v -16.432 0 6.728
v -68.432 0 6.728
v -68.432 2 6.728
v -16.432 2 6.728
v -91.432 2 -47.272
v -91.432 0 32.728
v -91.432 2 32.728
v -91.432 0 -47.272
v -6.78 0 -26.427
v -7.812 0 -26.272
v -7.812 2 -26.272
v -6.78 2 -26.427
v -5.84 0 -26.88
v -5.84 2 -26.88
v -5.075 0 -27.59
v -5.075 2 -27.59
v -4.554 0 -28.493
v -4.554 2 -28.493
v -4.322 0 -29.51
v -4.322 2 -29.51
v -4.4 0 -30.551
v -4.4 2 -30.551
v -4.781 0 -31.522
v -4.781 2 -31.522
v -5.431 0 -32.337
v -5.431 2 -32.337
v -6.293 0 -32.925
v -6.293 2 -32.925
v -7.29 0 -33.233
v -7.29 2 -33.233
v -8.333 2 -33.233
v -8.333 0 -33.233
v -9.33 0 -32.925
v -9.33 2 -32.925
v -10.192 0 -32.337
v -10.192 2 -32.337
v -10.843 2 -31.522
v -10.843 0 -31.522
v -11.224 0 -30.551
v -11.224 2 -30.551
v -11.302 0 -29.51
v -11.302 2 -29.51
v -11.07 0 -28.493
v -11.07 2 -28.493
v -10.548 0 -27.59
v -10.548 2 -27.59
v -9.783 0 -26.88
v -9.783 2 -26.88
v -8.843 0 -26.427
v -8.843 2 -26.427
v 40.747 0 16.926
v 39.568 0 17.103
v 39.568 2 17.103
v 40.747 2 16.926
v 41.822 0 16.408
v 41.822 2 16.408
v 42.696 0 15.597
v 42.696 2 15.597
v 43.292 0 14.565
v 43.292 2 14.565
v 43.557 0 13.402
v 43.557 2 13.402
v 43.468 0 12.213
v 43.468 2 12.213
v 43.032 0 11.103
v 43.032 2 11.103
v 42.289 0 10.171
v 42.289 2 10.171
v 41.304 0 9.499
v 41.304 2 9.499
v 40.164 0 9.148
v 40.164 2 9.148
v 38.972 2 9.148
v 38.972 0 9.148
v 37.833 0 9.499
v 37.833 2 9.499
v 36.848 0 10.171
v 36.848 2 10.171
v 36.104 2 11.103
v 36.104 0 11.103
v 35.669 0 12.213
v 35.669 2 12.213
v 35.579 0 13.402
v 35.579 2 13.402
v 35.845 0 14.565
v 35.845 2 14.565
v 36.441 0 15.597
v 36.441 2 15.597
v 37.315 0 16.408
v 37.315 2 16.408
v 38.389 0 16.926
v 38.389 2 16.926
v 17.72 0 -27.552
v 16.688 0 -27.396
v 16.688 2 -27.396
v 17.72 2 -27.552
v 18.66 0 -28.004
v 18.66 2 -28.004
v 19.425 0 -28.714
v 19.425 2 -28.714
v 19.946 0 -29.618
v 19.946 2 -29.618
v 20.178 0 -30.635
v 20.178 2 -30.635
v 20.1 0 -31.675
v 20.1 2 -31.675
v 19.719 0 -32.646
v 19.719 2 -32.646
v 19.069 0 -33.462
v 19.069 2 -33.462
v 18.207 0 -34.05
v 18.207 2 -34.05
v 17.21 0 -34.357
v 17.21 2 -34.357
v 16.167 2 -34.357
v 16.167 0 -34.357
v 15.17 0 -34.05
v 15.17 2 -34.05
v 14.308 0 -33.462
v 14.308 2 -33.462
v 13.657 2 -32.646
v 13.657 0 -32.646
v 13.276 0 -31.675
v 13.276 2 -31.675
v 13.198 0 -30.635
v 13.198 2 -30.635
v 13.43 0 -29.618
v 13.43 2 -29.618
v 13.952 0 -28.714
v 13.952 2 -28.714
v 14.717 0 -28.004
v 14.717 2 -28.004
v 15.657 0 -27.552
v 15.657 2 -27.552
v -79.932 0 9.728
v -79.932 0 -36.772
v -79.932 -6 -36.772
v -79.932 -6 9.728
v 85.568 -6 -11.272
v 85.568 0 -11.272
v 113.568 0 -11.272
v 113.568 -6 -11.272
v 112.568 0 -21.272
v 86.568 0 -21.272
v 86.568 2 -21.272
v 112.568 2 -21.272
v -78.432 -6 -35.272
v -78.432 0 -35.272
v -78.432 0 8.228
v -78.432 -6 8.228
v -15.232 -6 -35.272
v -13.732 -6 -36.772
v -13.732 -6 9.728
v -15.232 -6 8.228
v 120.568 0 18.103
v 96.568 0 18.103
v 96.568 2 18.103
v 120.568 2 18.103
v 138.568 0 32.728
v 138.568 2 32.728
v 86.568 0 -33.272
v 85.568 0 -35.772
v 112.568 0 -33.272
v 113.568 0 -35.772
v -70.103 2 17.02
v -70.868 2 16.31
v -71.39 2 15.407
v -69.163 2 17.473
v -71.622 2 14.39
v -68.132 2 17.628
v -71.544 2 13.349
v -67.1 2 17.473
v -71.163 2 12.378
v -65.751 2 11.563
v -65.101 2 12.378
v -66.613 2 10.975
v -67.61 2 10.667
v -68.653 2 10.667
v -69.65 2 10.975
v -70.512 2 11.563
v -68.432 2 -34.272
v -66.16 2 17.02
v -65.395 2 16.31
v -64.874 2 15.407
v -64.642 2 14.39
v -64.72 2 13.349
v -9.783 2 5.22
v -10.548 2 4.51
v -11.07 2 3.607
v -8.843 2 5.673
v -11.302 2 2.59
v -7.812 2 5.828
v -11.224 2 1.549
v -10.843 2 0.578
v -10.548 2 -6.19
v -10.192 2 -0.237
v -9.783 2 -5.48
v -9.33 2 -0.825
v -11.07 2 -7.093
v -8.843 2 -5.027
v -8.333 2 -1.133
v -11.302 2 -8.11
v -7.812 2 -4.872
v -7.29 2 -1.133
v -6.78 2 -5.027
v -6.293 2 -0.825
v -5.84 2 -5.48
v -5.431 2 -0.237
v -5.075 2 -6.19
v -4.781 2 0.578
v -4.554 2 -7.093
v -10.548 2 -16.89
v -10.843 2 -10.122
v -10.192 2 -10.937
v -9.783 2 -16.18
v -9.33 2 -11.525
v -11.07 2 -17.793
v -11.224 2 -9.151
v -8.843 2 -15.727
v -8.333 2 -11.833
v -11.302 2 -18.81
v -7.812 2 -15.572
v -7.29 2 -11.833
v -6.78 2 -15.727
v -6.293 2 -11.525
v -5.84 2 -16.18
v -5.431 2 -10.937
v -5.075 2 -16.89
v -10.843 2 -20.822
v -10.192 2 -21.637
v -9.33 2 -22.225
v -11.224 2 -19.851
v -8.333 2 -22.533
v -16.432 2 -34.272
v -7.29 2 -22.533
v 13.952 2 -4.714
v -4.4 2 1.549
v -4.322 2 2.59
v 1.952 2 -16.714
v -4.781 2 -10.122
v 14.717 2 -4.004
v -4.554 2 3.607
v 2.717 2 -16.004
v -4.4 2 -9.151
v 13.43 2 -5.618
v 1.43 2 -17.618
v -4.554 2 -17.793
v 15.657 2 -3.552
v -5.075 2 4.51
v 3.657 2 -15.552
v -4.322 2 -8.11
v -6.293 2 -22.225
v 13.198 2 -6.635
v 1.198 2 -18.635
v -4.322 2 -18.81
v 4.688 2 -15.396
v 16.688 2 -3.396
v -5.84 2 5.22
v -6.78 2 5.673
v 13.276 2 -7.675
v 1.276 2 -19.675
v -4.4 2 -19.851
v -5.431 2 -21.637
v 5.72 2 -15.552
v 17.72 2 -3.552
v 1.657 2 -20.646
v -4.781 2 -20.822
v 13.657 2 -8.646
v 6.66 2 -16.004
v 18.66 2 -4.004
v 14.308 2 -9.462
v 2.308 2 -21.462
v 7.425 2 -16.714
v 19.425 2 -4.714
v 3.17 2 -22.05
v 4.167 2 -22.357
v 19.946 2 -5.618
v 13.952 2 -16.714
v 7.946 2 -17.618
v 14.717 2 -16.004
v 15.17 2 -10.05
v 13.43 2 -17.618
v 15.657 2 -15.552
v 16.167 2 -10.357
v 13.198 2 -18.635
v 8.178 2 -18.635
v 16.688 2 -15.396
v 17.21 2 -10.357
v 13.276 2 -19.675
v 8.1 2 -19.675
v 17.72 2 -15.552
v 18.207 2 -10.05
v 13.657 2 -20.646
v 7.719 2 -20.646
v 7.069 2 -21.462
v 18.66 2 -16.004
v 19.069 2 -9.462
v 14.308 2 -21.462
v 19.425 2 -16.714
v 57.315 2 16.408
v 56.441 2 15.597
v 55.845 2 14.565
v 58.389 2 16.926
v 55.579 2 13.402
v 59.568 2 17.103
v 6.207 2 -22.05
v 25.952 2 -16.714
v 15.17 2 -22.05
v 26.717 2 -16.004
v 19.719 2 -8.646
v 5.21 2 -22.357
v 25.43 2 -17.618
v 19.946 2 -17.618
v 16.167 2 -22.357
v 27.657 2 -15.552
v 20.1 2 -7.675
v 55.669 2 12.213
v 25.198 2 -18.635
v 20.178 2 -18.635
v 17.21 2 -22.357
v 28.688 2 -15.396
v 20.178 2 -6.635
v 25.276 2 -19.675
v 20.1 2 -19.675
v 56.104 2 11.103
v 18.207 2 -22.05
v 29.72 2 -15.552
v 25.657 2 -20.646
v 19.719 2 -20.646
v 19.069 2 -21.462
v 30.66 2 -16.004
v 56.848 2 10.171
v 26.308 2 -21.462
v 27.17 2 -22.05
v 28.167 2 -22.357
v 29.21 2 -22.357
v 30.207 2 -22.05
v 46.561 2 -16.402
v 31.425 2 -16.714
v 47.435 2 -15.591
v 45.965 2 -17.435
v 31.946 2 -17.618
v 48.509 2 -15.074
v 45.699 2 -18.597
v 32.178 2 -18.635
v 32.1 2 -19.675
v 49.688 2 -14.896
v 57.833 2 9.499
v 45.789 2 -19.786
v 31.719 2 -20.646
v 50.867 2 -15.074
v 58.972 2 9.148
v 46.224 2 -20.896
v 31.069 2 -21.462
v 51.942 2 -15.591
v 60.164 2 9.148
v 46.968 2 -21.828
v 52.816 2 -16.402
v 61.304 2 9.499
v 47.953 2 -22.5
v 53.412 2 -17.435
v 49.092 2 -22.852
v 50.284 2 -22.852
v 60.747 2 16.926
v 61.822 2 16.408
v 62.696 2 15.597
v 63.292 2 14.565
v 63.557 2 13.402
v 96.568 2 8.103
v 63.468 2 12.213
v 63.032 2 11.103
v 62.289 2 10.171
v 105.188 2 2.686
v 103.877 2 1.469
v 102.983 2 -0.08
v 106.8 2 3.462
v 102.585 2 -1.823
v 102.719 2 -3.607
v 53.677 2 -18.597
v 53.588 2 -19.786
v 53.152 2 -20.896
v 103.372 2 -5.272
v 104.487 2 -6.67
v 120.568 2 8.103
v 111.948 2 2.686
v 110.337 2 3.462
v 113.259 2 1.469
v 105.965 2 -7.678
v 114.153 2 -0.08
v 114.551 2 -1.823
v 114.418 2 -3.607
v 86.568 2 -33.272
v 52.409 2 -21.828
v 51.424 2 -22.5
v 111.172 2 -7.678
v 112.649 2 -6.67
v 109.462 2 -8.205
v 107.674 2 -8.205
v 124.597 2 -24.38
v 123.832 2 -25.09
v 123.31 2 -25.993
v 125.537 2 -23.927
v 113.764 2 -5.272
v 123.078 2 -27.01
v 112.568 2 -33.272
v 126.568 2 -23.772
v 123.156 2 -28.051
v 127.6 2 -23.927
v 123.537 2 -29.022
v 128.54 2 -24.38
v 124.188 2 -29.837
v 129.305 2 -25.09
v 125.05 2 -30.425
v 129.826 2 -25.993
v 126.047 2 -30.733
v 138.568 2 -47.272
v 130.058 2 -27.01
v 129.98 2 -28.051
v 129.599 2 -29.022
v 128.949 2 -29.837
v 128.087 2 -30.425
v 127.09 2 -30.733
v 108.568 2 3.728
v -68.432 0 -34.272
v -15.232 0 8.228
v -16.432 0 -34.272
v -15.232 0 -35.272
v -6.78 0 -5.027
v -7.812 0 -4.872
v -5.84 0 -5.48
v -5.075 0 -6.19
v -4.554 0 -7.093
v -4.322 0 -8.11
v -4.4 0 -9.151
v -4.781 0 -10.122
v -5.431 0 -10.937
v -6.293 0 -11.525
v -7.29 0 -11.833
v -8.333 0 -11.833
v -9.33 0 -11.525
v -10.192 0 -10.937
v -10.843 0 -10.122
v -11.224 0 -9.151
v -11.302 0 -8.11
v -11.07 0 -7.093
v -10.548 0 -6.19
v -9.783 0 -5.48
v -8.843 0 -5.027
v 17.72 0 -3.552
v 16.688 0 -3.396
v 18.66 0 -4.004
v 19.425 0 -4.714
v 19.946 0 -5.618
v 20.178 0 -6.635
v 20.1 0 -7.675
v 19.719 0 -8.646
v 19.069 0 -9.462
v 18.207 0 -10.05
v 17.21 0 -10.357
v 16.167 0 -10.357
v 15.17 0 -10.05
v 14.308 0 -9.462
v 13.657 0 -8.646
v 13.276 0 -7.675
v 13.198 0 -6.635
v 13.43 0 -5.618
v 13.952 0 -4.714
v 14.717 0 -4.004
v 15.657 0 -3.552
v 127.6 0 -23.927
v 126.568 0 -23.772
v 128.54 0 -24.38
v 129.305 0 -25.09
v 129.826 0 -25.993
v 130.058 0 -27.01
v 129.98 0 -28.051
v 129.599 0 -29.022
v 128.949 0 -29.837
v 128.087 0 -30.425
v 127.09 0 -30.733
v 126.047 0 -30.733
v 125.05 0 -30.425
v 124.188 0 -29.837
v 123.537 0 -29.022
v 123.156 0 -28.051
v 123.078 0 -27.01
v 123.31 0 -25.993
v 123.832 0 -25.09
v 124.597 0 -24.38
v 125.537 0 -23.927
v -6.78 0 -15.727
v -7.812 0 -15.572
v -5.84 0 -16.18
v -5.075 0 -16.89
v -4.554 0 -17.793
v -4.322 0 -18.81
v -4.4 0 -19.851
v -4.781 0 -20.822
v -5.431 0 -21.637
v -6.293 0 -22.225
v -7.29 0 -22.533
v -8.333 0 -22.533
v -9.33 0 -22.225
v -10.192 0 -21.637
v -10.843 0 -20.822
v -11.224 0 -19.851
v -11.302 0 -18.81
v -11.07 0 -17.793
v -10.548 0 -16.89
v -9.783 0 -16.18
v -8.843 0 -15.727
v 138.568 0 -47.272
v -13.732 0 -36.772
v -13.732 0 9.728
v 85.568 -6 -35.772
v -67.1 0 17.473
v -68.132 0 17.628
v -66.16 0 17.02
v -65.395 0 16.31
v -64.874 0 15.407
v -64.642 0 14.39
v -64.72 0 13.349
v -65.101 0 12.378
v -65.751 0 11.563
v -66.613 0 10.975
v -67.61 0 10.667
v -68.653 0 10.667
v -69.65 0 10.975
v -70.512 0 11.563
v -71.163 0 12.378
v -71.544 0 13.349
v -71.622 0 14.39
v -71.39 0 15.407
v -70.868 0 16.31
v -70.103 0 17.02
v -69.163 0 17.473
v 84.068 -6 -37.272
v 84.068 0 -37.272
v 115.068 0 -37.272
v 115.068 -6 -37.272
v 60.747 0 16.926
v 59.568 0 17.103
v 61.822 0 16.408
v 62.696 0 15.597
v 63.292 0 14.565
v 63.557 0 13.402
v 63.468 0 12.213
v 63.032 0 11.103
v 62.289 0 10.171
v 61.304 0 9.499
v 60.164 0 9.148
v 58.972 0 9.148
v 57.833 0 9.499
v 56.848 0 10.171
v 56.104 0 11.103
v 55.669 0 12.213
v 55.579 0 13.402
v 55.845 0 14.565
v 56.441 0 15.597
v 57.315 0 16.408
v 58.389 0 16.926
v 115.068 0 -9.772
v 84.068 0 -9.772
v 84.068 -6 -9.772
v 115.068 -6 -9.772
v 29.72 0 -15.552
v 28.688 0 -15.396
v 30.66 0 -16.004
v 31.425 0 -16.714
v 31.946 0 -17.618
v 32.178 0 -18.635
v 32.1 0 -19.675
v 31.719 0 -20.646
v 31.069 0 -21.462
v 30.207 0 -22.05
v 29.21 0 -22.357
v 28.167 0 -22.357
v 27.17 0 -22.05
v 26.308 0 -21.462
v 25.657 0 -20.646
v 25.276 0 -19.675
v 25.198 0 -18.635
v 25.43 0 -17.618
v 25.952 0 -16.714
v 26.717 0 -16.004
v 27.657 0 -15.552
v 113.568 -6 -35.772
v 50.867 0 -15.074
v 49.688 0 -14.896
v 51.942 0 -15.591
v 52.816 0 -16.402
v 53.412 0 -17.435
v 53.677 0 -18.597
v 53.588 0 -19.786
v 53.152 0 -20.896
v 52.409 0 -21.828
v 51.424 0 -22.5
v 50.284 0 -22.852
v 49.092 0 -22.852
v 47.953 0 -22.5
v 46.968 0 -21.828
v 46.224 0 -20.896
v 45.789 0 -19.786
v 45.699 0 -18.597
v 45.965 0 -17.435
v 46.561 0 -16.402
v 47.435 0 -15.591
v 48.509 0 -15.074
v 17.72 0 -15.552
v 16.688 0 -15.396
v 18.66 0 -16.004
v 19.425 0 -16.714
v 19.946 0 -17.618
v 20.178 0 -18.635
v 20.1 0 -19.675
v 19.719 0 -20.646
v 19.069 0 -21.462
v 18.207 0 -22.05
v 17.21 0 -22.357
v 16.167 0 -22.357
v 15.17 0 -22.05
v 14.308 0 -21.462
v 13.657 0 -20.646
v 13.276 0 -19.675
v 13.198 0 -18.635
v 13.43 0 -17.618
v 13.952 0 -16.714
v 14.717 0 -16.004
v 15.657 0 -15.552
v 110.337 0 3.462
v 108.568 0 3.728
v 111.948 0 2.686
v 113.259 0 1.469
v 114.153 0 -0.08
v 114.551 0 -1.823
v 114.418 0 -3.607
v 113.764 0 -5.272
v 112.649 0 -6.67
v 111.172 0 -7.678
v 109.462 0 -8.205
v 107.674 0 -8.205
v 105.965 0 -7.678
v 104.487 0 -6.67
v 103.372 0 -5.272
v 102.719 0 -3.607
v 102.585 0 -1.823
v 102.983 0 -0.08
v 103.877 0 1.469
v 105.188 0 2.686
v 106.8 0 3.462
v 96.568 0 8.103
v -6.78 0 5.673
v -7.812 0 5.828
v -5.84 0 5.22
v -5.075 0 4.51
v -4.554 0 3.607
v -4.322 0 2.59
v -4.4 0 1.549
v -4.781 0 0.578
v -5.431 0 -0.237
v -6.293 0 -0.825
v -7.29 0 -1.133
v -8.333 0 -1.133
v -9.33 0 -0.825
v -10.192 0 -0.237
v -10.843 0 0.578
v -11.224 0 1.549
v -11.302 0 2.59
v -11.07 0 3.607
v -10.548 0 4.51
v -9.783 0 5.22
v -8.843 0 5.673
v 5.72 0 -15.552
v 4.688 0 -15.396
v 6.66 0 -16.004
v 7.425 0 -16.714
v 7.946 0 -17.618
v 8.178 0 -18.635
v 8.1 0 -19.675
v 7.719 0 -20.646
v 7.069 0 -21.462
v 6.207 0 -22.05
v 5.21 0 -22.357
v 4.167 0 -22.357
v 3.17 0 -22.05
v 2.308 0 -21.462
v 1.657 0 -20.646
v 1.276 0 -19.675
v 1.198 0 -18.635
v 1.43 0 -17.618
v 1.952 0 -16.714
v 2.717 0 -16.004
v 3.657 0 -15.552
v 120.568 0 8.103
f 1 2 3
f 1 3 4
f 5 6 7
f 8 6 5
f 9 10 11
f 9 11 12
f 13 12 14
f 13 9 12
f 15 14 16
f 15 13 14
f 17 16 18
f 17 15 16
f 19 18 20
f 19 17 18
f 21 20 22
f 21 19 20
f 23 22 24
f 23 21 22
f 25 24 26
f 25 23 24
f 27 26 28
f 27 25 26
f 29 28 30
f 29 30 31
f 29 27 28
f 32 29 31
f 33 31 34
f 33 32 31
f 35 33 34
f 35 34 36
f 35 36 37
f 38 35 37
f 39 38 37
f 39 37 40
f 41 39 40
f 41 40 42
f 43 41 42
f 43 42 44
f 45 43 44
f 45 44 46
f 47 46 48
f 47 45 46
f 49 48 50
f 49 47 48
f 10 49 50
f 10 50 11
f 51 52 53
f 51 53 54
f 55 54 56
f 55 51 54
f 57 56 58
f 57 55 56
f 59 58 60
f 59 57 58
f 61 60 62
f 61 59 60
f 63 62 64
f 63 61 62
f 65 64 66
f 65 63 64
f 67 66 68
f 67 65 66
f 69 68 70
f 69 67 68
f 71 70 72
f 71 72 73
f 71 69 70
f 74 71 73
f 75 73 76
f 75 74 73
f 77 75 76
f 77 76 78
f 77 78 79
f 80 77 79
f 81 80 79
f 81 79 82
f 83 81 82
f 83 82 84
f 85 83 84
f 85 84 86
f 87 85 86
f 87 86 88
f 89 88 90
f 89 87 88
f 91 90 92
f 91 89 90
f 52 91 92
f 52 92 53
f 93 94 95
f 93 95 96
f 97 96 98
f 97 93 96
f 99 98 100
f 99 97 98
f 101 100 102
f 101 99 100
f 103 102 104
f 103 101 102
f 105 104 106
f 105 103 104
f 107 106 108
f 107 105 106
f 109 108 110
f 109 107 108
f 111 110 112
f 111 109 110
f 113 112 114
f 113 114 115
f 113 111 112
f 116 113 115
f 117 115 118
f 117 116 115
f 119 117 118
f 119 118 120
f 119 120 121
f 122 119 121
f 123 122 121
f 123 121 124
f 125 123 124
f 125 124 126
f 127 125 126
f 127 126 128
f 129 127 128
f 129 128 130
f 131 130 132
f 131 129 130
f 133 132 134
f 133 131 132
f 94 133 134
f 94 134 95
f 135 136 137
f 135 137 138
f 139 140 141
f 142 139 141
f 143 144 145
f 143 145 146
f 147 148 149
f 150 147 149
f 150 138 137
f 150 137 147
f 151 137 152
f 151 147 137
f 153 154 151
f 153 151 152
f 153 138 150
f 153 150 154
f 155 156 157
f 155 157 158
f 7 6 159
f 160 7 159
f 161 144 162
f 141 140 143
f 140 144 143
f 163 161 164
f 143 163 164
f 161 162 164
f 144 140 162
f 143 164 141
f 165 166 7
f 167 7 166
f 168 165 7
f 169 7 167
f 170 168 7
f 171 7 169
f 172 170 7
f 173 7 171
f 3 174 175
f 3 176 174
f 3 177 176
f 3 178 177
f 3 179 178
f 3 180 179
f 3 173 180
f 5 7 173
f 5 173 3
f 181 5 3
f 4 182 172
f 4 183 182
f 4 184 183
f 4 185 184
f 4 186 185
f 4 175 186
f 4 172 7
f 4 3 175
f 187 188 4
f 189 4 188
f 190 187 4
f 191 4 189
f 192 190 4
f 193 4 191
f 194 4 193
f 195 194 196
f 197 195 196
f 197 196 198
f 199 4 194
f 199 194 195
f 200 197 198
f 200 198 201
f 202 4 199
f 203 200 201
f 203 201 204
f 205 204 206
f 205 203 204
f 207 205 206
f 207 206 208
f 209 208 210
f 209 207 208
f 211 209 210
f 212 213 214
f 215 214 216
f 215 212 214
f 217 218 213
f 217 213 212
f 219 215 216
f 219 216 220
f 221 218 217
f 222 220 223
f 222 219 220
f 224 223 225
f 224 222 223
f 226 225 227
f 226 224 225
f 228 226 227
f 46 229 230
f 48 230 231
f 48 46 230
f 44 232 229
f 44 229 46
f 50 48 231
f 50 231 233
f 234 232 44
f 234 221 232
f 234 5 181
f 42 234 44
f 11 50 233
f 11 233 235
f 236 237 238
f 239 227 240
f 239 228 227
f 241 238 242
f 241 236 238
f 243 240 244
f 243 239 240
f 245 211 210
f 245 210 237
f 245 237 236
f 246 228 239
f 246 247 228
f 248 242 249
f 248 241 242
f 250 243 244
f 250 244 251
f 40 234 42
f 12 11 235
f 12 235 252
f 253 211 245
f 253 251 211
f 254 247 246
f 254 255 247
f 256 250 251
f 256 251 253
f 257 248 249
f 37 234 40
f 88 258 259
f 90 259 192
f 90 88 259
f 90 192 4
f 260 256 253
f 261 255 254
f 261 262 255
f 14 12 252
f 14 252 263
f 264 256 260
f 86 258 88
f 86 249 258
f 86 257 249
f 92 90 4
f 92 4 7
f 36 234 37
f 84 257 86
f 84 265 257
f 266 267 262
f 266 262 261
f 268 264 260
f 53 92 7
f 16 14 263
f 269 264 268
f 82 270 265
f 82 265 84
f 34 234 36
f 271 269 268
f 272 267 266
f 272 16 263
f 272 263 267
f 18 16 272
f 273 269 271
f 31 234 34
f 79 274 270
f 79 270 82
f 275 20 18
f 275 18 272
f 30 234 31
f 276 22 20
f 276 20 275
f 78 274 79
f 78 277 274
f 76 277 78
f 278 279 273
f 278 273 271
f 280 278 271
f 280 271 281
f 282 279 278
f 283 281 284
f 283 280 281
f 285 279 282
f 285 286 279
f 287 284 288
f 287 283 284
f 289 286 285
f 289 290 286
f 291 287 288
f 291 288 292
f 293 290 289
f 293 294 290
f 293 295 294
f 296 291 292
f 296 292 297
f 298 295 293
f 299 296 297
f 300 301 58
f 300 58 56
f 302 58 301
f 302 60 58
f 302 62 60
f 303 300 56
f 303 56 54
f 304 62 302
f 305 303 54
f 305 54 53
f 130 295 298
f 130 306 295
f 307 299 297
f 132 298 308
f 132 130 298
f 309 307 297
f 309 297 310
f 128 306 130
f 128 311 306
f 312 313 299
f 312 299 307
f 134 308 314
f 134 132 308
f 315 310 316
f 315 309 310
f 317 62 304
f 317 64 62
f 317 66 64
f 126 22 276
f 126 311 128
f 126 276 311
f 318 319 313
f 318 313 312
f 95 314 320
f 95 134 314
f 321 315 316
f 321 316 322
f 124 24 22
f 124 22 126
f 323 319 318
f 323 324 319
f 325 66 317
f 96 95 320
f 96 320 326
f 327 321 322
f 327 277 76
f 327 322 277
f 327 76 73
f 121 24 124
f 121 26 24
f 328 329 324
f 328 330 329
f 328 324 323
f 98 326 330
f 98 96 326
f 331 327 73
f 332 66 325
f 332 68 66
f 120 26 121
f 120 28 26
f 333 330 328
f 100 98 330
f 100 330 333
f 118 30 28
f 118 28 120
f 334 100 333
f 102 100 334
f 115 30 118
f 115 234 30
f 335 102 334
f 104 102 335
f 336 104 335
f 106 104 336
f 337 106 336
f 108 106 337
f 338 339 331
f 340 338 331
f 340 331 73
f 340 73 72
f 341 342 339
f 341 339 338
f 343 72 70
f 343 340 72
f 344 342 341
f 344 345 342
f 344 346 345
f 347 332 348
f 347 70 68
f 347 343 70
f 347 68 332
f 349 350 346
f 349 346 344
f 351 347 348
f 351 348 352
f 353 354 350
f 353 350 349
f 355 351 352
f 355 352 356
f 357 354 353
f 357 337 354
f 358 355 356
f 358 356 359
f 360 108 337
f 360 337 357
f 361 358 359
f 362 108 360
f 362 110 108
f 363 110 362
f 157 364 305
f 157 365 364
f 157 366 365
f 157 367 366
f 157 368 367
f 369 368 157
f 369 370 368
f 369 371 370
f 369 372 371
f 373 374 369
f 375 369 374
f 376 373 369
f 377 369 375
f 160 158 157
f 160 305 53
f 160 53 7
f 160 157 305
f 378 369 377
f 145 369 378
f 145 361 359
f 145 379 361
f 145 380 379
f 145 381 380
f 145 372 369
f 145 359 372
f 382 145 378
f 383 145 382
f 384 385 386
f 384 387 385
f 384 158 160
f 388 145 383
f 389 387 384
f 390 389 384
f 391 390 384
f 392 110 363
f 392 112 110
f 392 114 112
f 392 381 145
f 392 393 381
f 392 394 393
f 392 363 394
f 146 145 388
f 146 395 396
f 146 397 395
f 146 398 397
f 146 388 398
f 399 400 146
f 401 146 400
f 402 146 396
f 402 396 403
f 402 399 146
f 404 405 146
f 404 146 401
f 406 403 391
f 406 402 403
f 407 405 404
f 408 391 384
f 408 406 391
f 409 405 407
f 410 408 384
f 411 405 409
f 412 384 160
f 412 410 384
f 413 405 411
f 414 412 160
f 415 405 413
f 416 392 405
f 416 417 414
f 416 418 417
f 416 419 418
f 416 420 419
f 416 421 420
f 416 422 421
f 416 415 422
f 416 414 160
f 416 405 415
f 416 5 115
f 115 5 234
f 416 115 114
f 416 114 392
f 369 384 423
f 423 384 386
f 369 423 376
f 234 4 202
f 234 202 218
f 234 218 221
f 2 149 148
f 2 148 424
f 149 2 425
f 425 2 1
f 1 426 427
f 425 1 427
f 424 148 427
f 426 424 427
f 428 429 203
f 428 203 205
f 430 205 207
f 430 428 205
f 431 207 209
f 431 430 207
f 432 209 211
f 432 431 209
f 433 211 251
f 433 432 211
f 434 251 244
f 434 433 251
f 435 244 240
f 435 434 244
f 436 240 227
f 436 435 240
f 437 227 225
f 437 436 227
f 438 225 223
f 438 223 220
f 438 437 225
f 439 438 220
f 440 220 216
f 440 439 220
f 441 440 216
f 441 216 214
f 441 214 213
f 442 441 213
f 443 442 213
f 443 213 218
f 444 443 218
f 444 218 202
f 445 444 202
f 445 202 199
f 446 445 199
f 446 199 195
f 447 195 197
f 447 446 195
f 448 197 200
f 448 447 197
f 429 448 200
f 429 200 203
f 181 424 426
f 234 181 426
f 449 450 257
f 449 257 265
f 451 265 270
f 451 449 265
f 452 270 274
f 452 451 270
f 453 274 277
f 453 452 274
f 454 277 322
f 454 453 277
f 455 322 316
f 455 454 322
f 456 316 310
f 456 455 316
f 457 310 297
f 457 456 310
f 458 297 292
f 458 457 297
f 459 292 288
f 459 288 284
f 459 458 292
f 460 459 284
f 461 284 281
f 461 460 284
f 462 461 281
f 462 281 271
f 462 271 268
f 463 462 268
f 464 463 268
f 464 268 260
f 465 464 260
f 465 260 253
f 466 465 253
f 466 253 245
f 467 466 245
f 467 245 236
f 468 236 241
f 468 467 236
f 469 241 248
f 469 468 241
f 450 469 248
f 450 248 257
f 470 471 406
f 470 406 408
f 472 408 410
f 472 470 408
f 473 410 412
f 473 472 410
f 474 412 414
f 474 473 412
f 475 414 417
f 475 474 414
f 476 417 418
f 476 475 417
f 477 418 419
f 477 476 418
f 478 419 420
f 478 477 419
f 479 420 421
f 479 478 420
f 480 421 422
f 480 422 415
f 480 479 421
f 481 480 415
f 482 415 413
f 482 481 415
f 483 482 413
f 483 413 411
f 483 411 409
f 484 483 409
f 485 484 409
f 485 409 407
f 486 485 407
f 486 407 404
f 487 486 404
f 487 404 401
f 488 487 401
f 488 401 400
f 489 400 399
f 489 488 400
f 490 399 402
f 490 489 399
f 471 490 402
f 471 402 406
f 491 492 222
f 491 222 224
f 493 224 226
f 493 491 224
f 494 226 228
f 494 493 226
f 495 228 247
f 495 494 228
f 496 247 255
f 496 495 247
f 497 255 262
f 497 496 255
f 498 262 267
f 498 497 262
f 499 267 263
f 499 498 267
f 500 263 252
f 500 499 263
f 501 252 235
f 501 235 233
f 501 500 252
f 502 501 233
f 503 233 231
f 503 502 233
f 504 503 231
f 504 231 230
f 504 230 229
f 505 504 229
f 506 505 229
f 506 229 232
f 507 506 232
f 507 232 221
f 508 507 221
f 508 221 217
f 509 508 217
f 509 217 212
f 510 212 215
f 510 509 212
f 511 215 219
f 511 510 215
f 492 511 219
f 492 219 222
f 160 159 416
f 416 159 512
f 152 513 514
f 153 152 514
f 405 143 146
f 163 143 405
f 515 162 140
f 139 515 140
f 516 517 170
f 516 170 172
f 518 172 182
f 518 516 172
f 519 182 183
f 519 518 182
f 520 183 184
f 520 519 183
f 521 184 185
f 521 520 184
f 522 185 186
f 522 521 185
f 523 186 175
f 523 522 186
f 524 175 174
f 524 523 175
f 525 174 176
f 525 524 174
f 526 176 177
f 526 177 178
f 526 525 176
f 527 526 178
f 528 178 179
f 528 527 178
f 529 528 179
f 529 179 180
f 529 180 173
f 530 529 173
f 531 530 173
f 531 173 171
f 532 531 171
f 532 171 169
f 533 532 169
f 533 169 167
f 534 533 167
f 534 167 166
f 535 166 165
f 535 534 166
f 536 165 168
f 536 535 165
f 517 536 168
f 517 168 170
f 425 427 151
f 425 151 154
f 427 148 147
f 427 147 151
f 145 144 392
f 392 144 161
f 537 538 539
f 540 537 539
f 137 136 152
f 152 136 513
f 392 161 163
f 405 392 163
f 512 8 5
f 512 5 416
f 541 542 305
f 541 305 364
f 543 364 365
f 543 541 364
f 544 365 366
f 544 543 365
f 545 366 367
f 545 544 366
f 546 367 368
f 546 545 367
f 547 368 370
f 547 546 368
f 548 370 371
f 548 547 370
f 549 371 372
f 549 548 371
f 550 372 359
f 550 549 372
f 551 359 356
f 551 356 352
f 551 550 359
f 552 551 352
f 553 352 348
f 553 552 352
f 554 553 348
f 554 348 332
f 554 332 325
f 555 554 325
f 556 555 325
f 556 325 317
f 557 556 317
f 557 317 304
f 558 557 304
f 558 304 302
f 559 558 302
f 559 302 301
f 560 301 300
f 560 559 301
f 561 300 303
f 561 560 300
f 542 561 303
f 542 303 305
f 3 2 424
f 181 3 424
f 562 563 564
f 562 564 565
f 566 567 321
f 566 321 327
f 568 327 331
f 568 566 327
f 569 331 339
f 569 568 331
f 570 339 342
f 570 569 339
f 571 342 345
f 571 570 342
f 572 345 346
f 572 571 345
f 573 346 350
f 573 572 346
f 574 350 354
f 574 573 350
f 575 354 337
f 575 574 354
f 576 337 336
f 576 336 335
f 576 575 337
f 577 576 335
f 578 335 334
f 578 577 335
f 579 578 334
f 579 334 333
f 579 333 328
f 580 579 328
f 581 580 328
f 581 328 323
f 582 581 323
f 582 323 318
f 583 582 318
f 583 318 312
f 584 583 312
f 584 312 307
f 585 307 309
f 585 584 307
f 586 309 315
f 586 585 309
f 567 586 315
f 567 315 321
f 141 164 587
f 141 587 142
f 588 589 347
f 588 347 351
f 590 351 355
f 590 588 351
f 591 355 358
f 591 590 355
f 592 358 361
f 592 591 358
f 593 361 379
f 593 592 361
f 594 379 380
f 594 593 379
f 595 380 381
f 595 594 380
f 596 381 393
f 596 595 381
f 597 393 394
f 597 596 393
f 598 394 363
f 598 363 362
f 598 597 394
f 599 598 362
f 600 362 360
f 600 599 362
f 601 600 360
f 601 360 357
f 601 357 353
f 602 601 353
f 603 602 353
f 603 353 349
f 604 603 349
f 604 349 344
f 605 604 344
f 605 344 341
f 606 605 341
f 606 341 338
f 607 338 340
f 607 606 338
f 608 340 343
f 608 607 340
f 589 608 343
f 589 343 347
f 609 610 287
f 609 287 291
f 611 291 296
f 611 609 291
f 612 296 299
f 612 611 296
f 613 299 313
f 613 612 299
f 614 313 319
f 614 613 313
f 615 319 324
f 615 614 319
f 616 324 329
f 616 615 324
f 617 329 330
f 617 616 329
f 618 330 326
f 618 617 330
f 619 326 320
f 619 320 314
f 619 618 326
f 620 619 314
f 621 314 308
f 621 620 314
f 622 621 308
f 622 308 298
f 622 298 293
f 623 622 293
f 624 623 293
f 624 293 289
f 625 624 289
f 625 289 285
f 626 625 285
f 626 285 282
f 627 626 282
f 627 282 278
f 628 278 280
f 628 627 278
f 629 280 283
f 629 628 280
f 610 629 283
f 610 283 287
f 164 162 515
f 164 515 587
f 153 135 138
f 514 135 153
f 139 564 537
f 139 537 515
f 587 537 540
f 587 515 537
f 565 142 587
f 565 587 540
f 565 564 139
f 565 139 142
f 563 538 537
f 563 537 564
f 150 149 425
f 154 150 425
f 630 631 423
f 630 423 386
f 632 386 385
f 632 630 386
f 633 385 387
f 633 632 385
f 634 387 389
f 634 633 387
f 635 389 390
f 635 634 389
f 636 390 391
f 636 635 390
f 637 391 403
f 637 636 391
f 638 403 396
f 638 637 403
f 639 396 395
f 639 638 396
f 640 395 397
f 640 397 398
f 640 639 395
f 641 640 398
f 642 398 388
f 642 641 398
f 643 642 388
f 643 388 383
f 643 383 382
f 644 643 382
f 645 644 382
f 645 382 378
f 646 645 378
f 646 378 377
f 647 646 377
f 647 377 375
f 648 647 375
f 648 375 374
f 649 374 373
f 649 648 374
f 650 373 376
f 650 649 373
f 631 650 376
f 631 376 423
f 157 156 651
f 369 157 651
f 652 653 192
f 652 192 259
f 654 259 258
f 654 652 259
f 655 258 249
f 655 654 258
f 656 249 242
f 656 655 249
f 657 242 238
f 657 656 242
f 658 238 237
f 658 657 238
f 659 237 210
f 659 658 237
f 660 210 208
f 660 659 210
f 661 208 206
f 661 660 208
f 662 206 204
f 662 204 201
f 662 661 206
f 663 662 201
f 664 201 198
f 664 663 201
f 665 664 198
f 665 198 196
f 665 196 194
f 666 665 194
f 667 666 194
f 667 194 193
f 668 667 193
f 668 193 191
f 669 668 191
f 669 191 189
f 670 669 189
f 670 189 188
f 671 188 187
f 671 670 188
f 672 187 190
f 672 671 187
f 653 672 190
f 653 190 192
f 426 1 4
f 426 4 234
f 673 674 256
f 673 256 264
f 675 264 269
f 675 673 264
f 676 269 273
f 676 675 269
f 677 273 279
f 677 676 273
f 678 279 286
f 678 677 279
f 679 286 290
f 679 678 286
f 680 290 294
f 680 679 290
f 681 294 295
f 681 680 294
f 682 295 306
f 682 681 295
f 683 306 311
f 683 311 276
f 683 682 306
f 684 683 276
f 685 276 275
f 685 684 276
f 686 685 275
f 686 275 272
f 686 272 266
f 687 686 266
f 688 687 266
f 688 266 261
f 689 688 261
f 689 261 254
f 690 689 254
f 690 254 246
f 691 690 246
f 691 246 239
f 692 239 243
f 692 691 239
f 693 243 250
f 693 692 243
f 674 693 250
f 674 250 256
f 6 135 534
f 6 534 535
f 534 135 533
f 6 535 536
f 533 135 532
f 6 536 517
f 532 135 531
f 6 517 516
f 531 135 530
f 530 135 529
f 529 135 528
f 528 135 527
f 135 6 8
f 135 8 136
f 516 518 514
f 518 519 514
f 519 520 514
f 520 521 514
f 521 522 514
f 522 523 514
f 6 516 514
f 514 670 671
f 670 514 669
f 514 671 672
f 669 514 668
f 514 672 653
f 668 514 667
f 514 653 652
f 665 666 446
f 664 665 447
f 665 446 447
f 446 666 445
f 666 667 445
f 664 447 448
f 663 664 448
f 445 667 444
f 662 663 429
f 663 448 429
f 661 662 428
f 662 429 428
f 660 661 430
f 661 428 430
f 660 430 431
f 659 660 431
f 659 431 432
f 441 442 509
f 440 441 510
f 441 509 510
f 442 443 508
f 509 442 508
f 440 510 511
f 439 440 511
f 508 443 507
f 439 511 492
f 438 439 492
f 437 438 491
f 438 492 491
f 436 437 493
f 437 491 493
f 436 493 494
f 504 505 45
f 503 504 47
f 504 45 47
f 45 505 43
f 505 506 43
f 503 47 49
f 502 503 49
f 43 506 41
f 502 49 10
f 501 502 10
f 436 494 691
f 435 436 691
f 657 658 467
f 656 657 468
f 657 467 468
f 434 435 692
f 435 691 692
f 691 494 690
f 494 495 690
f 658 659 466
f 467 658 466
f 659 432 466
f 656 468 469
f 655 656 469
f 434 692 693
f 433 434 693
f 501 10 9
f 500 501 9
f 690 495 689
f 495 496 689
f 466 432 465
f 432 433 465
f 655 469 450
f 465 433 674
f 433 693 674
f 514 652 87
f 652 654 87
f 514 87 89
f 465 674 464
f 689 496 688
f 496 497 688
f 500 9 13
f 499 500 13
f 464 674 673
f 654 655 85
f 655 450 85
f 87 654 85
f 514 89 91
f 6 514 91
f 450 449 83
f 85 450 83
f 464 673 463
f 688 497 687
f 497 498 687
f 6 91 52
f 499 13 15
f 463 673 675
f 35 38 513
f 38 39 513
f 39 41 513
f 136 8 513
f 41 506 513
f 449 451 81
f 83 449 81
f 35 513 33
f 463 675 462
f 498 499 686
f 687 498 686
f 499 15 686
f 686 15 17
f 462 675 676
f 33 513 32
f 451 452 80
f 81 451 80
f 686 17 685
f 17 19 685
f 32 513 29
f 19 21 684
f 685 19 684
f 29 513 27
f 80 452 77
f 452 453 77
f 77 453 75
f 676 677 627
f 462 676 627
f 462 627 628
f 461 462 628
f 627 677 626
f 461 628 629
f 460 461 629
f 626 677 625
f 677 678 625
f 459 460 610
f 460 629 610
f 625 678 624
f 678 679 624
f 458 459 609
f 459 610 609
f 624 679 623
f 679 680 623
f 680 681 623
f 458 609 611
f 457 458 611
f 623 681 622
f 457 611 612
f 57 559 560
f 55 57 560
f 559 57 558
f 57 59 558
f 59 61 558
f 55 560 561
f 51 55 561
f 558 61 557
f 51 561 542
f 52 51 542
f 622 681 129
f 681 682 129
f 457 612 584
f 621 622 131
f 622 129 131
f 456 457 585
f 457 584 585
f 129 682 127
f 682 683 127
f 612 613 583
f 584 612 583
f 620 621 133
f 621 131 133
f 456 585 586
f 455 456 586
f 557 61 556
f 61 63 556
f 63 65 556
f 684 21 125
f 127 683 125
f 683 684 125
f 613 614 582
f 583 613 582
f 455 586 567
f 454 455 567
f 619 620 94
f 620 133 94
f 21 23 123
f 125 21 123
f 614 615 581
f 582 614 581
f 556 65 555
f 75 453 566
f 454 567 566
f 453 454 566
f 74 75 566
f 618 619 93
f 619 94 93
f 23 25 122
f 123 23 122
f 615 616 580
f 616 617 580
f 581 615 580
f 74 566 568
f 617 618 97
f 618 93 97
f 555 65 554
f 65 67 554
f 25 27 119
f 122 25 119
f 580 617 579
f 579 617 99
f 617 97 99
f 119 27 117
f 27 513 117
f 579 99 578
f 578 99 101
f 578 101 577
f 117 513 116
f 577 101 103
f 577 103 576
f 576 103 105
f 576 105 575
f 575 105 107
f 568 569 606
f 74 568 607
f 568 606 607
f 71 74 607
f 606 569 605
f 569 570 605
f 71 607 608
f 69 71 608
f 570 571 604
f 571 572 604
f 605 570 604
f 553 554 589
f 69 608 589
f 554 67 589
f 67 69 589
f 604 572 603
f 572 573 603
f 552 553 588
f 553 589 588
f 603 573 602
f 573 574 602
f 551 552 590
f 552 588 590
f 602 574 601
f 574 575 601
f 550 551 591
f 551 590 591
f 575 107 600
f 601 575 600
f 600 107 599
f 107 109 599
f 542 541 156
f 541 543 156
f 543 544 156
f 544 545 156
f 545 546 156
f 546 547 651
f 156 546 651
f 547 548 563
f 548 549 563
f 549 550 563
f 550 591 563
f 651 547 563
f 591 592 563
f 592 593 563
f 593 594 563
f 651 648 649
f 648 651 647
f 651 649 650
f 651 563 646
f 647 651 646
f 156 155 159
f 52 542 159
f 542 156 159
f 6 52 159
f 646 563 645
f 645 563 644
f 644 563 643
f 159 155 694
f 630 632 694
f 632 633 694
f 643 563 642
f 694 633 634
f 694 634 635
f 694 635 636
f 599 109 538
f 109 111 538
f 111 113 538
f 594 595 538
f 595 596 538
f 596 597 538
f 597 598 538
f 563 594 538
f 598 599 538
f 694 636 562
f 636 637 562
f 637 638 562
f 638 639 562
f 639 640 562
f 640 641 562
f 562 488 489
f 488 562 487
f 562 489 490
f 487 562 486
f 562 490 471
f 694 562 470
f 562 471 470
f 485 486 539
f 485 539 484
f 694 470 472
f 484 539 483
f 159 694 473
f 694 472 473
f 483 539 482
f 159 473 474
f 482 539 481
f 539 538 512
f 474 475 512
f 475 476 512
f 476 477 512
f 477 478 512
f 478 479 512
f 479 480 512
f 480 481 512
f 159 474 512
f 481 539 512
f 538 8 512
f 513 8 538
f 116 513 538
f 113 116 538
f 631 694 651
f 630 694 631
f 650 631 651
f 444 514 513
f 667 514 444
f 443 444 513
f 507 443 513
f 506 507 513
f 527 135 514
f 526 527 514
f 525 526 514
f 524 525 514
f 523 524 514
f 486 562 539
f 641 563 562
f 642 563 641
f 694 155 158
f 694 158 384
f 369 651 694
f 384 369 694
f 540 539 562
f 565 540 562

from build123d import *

# Parameters (mm, degrees)
SKETCH_1_W      = 230
SKETCH_1_H      = 80
SKETCH_1_R      = 3.5
SKETCH_1_R_2    = 4
SKETCH_1_R_3    = 6
SKETCH_1_W_2    = 52
SKETCH_1_H_2    = 41
SKETCH_1_W_3    = 26
SKETCH_1_H_3    = 12
SKETCH_1_W_4    = 24
SKETCH_1_H_4    = 10
EXTRUDE_1_DEPTH = 2
SKETCH_3_W      = 66.2
SKETCH_3_H      = 46.5
SKETCH_3_W_2    = 63.2
SKETCH_3_H_2    = 43.5
SKETCH_3_W_3    = 31
SKETCH_3_H_3    = 27.5
SKETCH_3_W_4    = 28
SKETCH_3_H_4    = 24.5
EXTRUDE_2_DEPTH = 6


with BuildPart() as part:
    # 草图1 → 凸台-拉伸1 (new body)
    with BuildSketch(Plane(origin=(0, 0, 0), x_dir=(1, 0, 0), z_dir=(0, 1, 0))):
        with Locations((23.568232821, 7.271766922)):
            Rectangle(SKETCH_1_W, SKETCH_1_H)
        with Locations(Location((-68.131767179, -14.128233078, 0), (0, 0, 270))):
            Circle(SKETCH_1_R, mode=Mode.SUBTRACT)
        with Locations(Location((-7.811767179, 29.771766922, 0), (0, 0, 270))):
            Circle(SKETCH_1_R, mode=Mode.SUBTRACT)
        with Locations(Location((-7.811767179, 19.071766922, 0), (0, 0, 270))):
            Circle(SKETCH_1_R, mode=Mode.SUBTRACT)
        with Locations(Location((-7.811767179, 8.371766922, 0), (0, 0, 270))):
            Circle(SKETCH_1_R, mode=Mode.SUBTRACT)
        with Locations(Location((-7.811767179, -2.328233078, 0), (0, 0, 270))):
            Circle(SKETCH_1_R, mode=Mode.SUBTRACT)
        with Locations(Location((16.688232821, 30.896203348, 0), (0, 0, 270))):
            Circle(SKETCH_1_R, mode=Mode.SUBTRACT)
        with Locations(Location((16.688232821, 18.896203348, 0), (0, 0, 270))):
            Circle(SKETCH_1_R, mode=Mode.SUBTRACT)
        with Locations(Location((16.688232821, 6.896203348, 0), (0, 0, 270))):
            Circle(SKETCH_1_R, mode=Mode.SUBTRACT)
        with Locations(Location((4.688232821, 18.896203348, 0), (0, 0, 270))):
            Circle(SKETCH_1_R, mode=Mode.SUBTRACT)
        with Locations(Location((28.688232821, 18.896203348, 0), (0, 0, 270))):
            Circle(SKETCH_1_R, mode=Mode.SUBTRACT)
        with Locations(Location((49.688232821, 18.896203348, 0), (0, 0, 270))):
            Circle(SKETCH_1_R_2, mode=Mode.SUBTRACT)
        with Locations(Location((59.568232821, -13.103233078, 0), (0, 0, 270))):
            Circle(SKETCH_1_R_2, mode=Mode.SUBTRACT)
        with Locations(Location((39.568232821, -13.103233078, 0), (0, 0, 270))):
            Circle(SKETCH_1_R_2, mode=Mode.SUBTRACT)
        with Locations(Location((126.568232821, 27.271766922, 0), (0, 0, 270))):
            Circle(SKETCH_1_R, mode=Mode.SUBTRACT)
        with Locations(Location((108.568232821, 2.271766922, 0), (0, 0, 270))):
            Circle(SKETCH_1_R_3, mode=Mode.SUBTRACT)
        with Locations((-42.431767179, 13.771766922)):
            Rectangle(SKETCH_1_W_2, SKETCH_1_H_2, mode=Mode.SUBTRACT)
        with Locations((99.568232821, 27.271766922)):
            Rectangle(SKETCH_1_W_3, SKETCH_1_H_3, mode=Mode.SUBTRACT)
        with Locations((108.568232821, -13.103233078)):
            Rectangle(SKETCH_1_W_4, SKETCH_1_H_4, mode=Mode.SUBTRACT)
    extrude(amount=EXTRUDE_1_DEPTH)

    # 草图3 → 凸台-拉伸2 (add)
    # profile 1 of 2: a face of its own
    with BuildSketch(Plane.XZ):
        with Locations((-46.831767179, -13.521766922)):
            Rectangle(SKETCH_3_W, SKETCH_3_H)
        with Locations((-46.831767179, -13.521766922)):
            Rectangle(SKETCH_3_W_2, SKETCH_3_H_2, mode=Mode.SUBTRACT)
    # profile 2 of 2: a face of its own
    with BuildSketch(Plane.XZ):
        with Locations((99.568232821, -23.521766922)):
            Rectangle(SKETCH_3_W_3, SKETCH_3_H_3)
        with Locations((99.568232821, -23.521766922)):
            Rectangle(SKETCH_3_W_4, SKETCH_3_H_4, mode=Mode.SUBTRACT)
    extrude(amount=EXTRUDE_2_DEPTH)


solid = part.part
